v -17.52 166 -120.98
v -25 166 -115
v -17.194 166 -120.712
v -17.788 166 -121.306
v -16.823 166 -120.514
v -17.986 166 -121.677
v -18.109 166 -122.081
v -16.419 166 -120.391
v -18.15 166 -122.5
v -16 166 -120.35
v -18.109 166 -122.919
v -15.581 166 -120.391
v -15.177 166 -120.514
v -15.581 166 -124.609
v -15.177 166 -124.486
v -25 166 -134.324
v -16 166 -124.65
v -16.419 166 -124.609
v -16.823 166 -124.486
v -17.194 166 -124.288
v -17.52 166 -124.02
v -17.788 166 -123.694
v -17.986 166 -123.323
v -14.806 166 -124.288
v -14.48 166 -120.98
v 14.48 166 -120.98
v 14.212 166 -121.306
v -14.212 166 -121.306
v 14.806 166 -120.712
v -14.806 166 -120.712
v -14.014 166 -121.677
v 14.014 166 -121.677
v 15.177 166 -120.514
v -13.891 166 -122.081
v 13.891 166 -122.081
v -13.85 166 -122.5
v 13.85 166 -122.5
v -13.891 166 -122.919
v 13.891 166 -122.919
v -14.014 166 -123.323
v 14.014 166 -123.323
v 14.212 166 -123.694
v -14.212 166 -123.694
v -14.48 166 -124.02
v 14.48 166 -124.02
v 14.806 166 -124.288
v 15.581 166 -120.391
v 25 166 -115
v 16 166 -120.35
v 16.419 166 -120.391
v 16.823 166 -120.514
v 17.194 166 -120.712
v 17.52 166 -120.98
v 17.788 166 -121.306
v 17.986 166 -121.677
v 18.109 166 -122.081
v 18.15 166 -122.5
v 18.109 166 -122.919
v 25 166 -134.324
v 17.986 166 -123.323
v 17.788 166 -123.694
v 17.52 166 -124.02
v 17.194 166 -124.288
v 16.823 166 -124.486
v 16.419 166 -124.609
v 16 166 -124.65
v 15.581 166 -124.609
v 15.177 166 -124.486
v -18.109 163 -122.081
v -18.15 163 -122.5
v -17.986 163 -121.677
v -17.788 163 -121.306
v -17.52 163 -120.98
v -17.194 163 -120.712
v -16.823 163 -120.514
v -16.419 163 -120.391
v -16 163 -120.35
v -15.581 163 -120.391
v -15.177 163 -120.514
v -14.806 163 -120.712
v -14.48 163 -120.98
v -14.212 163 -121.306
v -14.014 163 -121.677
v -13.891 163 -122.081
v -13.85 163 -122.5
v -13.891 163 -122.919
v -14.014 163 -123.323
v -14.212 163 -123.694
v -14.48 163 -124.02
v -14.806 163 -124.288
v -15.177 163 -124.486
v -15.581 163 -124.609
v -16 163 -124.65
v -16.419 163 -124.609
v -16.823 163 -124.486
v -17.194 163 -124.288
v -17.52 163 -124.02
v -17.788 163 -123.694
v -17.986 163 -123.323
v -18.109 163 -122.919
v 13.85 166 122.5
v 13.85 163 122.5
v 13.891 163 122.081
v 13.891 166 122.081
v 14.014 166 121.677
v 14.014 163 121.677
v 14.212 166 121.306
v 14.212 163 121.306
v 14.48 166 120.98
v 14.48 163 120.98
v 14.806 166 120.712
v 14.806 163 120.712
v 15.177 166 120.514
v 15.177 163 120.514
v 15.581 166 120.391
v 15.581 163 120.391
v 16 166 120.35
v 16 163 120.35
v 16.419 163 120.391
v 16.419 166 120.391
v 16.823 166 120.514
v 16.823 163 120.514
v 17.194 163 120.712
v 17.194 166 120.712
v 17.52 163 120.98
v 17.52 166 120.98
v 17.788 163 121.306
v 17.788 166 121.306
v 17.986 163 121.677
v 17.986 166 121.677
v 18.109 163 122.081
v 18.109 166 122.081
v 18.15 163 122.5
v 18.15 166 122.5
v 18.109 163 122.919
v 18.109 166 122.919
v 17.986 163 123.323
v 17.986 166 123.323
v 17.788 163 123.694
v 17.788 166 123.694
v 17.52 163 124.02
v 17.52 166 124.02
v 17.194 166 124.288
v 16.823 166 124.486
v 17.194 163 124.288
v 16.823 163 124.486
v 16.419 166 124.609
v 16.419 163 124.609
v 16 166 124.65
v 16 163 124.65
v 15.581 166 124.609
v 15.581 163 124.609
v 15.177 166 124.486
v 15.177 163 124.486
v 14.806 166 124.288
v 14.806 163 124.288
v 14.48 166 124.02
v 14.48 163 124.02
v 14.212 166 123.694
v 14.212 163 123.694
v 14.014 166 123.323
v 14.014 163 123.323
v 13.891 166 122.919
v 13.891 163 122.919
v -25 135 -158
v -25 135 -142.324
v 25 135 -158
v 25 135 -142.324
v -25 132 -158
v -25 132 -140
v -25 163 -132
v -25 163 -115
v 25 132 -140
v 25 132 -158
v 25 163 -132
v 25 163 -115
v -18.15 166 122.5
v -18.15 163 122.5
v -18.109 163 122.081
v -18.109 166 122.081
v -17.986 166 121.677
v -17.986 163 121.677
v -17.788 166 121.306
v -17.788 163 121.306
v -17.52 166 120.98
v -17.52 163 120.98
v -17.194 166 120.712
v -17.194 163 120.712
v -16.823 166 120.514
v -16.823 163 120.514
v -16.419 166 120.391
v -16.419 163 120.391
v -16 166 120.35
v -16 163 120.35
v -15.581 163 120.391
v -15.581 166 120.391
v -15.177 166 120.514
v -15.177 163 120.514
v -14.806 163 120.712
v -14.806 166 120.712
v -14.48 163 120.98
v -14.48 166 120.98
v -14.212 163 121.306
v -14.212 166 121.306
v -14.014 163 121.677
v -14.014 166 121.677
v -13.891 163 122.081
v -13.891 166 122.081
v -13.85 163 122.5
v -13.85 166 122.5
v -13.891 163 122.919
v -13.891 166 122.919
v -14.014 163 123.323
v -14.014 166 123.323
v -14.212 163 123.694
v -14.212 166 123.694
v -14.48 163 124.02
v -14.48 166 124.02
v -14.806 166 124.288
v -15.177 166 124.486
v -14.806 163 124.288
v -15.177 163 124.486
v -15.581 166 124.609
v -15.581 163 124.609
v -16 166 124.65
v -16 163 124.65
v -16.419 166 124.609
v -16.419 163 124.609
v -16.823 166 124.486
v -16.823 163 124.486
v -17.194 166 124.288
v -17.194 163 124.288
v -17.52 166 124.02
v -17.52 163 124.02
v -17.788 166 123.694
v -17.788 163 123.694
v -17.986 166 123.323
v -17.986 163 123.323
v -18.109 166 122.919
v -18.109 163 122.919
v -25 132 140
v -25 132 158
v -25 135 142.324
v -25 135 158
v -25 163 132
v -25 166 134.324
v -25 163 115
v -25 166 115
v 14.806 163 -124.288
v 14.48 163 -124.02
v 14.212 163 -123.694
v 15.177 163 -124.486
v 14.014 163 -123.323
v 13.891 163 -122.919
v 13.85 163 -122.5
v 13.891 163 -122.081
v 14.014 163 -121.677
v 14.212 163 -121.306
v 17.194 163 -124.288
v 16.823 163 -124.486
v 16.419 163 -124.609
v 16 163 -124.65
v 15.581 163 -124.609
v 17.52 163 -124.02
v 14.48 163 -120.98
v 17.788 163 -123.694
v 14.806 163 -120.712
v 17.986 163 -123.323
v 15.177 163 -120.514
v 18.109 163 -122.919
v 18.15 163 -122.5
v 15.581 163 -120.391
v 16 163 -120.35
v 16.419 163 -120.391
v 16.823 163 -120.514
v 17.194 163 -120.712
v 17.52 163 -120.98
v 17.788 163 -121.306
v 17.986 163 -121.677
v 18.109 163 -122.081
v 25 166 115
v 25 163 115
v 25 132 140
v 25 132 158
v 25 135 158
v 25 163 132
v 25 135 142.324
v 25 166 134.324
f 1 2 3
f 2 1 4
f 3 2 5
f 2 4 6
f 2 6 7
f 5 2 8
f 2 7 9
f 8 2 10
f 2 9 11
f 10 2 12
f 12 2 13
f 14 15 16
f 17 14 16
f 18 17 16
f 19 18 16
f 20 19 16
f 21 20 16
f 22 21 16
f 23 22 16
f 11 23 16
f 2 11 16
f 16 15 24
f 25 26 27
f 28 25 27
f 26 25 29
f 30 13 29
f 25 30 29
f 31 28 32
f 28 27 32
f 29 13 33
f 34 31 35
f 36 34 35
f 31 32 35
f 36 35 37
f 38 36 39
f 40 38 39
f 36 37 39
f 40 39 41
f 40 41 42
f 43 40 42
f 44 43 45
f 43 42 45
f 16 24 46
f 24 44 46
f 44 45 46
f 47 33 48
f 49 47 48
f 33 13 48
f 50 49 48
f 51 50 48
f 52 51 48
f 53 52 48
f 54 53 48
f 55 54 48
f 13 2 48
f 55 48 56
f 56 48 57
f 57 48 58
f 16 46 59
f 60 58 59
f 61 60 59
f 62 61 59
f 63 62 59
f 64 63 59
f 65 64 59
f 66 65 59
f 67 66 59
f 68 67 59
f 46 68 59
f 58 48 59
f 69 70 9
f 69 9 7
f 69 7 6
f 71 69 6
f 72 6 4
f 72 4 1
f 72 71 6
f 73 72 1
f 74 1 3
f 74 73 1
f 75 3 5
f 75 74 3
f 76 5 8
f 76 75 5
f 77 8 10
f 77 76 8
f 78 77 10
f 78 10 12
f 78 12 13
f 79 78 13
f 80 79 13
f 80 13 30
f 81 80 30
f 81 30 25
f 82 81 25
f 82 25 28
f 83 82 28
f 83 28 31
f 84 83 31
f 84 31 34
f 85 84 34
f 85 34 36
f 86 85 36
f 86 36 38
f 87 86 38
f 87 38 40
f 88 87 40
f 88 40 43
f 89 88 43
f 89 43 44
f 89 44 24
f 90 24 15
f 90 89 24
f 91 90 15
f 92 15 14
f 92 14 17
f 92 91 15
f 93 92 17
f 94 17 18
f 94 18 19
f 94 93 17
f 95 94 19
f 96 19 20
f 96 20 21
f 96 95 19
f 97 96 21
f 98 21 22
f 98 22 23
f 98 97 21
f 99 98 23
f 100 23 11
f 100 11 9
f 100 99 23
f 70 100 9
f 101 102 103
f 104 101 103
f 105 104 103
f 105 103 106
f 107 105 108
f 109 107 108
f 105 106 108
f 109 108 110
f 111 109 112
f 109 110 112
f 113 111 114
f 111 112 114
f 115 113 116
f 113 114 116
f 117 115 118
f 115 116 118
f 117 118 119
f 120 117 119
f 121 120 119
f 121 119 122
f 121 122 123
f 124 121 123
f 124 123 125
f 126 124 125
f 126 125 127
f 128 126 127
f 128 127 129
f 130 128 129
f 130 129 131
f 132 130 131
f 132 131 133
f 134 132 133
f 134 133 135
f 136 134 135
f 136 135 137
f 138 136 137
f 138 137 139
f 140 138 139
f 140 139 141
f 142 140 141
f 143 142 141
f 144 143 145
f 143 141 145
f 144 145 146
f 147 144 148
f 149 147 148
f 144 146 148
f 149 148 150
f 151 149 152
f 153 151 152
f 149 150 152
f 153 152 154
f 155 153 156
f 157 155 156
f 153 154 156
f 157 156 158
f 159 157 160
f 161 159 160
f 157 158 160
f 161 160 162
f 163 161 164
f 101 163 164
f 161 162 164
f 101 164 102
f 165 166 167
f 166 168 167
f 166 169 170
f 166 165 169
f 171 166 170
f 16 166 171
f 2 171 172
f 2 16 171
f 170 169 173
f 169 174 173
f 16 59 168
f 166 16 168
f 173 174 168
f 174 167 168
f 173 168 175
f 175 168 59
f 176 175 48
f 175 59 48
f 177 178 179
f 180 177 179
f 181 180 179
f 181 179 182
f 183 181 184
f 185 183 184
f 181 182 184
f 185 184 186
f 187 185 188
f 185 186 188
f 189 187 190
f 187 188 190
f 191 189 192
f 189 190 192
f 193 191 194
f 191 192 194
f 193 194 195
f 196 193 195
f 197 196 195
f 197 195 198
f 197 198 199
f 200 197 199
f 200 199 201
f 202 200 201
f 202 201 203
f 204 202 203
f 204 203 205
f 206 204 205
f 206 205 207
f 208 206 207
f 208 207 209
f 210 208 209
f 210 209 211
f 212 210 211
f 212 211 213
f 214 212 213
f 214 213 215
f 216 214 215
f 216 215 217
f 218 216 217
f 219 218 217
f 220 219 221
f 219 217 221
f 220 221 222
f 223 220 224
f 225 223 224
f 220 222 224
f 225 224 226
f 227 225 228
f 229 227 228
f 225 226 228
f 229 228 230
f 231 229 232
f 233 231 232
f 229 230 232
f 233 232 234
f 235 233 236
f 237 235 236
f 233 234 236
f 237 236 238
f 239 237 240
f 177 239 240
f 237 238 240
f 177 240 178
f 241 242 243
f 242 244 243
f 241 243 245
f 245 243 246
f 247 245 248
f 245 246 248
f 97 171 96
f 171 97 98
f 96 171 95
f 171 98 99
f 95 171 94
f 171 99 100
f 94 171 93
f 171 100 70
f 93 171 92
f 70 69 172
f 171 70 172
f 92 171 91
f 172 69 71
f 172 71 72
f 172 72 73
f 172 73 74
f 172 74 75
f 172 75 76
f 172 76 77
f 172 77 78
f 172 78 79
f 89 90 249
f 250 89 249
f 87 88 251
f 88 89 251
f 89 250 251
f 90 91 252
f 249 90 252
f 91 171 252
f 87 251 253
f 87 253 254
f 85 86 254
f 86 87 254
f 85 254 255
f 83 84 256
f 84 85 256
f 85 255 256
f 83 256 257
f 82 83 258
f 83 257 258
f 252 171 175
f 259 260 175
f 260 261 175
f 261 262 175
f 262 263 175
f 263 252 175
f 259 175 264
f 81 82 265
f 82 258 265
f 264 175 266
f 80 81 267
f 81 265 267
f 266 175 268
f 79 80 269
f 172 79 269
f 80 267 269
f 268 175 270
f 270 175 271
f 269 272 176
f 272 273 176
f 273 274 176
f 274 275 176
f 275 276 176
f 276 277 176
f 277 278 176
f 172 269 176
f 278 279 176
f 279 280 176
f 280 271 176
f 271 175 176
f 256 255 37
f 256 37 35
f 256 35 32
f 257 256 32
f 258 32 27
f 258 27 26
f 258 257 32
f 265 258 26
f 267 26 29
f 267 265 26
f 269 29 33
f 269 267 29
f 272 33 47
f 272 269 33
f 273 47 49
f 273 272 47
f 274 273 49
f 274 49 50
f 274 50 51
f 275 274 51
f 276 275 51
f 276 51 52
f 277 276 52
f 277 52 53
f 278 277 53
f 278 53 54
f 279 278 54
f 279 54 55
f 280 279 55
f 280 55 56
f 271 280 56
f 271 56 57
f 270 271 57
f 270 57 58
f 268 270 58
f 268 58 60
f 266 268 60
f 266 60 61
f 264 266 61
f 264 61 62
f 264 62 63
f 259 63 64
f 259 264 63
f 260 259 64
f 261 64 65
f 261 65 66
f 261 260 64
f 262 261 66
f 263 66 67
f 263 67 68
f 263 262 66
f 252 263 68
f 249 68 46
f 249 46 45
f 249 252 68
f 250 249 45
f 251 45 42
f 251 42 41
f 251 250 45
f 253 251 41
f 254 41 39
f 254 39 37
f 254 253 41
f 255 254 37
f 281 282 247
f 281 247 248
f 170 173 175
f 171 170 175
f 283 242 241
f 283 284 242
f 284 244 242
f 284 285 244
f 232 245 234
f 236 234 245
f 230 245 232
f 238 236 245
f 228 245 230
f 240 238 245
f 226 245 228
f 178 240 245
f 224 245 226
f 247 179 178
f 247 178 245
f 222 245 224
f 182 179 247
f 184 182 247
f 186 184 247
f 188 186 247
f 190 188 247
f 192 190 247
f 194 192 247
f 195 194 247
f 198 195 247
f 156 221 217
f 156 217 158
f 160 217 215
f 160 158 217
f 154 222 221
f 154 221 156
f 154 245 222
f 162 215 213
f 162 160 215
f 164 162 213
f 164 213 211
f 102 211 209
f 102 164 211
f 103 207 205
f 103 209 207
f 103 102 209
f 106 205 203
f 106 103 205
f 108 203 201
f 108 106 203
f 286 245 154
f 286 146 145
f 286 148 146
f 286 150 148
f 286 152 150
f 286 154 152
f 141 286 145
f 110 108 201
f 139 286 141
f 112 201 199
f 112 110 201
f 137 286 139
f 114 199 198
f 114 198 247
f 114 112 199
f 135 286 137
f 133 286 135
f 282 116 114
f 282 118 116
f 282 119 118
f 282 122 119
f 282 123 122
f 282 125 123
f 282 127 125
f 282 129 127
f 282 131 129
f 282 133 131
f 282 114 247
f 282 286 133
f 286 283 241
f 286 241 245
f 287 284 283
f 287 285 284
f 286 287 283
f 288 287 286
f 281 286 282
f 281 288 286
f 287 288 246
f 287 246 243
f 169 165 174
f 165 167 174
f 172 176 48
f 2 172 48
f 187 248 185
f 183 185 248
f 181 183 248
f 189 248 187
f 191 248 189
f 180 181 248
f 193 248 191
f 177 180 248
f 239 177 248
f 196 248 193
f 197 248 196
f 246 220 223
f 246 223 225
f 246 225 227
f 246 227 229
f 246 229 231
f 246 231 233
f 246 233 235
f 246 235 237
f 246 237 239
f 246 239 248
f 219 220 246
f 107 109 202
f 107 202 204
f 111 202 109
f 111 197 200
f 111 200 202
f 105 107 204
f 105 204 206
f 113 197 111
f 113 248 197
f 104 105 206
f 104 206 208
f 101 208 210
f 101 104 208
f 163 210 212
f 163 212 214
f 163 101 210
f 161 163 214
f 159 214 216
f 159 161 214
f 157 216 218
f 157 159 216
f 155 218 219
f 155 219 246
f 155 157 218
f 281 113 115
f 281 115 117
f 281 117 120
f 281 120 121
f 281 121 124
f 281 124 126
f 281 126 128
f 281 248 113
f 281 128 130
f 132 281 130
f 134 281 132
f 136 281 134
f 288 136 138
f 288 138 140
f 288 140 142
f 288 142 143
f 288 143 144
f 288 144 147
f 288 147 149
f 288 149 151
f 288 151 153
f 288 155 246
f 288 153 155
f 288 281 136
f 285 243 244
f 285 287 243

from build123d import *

# Parameters (mm, degrees)
EXTRUDE_1_DEPTH    = 25
HOLE_WIZARD_M4_2_D = 4.3


with BuildPart() as part:
    # 草图1 → 拉伸-薄壁1 (new, symmetric)
    with BuildSketch(Plane(origin=(0, 0, 0), x_dir=(0, 0, -1), z_dir=(1, 0, 0))):
        Polygon((-158, 132), (-140, 132), (-132, 163), (-115, 163), (-115, 166), (-134.324092373, 166), (-142.324092373, 135), (-158, 135), align=None)
    extrude(amount=EXTRUDE_1_DEPTH, both=True)

    # M4 间隙孔2 (through all)
    with Locations(Plane(origin=(0, 166, 0), x_dir=(1, 0, 0), z_dir=(0, 1, 0))):
        with Locations((16, -122.5), (-16, -122.5)):
            Hole(HOLE_WIZARD_M4_2_D / 2)


with BuildPart() as body_2:
    # 镜向2: mirrored copy
    add(part.part.mirror(Plane.XY))


solid = Compound([part.part, body_2.part])
